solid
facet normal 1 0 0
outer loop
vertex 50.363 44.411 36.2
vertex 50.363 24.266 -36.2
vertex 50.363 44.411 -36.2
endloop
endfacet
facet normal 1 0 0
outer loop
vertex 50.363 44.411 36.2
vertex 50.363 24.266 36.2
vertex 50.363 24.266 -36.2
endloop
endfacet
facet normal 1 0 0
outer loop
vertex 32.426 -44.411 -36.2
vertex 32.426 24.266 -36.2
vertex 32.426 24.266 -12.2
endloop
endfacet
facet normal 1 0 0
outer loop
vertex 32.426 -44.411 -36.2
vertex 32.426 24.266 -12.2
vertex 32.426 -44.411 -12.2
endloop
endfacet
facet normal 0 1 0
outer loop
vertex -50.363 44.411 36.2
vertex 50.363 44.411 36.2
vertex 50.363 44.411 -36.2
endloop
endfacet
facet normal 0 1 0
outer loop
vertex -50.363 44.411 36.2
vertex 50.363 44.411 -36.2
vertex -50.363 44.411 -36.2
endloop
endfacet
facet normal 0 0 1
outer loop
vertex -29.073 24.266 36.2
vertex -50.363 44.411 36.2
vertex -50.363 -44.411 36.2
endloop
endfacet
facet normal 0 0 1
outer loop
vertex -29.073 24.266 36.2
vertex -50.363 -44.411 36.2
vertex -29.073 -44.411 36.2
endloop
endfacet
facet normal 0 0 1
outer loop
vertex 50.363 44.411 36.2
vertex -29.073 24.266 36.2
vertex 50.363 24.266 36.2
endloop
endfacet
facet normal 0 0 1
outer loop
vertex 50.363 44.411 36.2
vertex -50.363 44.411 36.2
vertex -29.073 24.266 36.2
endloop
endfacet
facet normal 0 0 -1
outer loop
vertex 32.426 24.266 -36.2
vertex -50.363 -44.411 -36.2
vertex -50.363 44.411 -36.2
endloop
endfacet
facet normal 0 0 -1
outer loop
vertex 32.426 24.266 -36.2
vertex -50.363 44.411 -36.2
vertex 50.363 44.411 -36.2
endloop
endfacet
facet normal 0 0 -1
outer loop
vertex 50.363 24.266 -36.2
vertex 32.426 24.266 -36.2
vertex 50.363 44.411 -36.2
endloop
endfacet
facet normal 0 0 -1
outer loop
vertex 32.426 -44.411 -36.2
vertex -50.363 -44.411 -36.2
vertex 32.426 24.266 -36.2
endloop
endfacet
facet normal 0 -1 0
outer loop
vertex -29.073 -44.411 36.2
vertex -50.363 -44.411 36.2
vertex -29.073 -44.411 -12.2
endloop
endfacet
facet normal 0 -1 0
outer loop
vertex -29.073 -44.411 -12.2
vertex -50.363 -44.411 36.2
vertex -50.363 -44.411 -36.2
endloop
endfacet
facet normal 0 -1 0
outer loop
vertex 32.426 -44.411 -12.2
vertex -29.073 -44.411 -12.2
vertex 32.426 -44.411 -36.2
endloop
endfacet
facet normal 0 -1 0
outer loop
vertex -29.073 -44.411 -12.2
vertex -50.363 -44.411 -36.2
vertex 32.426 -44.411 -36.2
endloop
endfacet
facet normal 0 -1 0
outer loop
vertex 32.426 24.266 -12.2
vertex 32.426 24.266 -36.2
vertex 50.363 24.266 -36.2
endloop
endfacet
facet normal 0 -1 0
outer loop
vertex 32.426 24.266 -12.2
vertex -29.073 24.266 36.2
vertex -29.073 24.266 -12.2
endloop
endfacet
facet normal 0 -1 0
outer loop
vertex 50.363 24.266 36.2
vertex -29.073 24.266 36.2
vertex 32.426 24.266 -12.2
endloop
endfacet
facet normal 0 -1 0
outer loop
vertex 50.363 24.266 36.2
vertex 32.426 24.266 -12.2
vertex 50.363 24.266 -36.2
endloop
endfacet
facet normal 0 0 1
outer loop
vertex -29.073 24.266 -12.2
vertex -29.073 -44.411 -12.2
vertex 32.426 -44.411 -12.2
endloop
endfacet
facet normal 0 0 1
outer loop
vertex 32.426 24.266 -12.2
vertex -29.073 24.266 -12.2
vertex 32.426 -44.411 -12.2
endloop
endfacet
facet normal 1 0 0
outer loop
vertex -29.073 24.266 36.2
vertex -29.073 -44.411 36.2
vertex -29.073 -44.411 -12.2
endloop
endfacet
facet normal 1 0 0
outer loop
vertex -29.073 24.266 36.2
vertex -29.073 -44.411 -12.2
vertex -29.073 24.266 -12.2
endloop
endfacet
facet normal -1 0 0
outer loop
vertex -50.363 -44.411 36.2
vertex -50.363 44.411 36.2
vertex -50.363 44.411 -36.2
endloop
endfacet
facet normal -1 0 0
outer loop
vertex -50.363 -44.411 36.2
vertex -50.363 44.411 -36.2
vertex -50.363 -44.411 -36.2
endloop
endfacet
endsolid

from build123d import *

# Parameters (mm, degrees)
F1_DEPTH = 36.2
F2_W     = 61.498966068
F2_H     = 68.6773248017
F3_DEPTH = 24


with BuildPart() as f1:
    # F0 (on Top) → F1 (new body, symmetric)
    with BuildSketch(Plane.XY):
        Polygon((50.3633767366, 24.2659896612), (50.3633767366, 44.4113351405), (-50.3633767366, 44.4113351405), (-50.3633767366, -44.4113351405), (-29.0734022856, -44.4113351405), (-29.0734022856, 24.2659896612), align=None)
    extrude(amount=F1_DEPTH, both=True)

    # F2 (on face) → F3 (join)
    with BuildSketch(Plane(origin=(0, 0, -36.2), x_dir=(1, 0, 0), z_dir=(0, 0, -1))):
        with Locations((1.6760807484, 10.0726727396)):
            Rectangle(F2_W, F2_H)
    extrude(amount=-F3_DEPTH)


solid = f1.part
